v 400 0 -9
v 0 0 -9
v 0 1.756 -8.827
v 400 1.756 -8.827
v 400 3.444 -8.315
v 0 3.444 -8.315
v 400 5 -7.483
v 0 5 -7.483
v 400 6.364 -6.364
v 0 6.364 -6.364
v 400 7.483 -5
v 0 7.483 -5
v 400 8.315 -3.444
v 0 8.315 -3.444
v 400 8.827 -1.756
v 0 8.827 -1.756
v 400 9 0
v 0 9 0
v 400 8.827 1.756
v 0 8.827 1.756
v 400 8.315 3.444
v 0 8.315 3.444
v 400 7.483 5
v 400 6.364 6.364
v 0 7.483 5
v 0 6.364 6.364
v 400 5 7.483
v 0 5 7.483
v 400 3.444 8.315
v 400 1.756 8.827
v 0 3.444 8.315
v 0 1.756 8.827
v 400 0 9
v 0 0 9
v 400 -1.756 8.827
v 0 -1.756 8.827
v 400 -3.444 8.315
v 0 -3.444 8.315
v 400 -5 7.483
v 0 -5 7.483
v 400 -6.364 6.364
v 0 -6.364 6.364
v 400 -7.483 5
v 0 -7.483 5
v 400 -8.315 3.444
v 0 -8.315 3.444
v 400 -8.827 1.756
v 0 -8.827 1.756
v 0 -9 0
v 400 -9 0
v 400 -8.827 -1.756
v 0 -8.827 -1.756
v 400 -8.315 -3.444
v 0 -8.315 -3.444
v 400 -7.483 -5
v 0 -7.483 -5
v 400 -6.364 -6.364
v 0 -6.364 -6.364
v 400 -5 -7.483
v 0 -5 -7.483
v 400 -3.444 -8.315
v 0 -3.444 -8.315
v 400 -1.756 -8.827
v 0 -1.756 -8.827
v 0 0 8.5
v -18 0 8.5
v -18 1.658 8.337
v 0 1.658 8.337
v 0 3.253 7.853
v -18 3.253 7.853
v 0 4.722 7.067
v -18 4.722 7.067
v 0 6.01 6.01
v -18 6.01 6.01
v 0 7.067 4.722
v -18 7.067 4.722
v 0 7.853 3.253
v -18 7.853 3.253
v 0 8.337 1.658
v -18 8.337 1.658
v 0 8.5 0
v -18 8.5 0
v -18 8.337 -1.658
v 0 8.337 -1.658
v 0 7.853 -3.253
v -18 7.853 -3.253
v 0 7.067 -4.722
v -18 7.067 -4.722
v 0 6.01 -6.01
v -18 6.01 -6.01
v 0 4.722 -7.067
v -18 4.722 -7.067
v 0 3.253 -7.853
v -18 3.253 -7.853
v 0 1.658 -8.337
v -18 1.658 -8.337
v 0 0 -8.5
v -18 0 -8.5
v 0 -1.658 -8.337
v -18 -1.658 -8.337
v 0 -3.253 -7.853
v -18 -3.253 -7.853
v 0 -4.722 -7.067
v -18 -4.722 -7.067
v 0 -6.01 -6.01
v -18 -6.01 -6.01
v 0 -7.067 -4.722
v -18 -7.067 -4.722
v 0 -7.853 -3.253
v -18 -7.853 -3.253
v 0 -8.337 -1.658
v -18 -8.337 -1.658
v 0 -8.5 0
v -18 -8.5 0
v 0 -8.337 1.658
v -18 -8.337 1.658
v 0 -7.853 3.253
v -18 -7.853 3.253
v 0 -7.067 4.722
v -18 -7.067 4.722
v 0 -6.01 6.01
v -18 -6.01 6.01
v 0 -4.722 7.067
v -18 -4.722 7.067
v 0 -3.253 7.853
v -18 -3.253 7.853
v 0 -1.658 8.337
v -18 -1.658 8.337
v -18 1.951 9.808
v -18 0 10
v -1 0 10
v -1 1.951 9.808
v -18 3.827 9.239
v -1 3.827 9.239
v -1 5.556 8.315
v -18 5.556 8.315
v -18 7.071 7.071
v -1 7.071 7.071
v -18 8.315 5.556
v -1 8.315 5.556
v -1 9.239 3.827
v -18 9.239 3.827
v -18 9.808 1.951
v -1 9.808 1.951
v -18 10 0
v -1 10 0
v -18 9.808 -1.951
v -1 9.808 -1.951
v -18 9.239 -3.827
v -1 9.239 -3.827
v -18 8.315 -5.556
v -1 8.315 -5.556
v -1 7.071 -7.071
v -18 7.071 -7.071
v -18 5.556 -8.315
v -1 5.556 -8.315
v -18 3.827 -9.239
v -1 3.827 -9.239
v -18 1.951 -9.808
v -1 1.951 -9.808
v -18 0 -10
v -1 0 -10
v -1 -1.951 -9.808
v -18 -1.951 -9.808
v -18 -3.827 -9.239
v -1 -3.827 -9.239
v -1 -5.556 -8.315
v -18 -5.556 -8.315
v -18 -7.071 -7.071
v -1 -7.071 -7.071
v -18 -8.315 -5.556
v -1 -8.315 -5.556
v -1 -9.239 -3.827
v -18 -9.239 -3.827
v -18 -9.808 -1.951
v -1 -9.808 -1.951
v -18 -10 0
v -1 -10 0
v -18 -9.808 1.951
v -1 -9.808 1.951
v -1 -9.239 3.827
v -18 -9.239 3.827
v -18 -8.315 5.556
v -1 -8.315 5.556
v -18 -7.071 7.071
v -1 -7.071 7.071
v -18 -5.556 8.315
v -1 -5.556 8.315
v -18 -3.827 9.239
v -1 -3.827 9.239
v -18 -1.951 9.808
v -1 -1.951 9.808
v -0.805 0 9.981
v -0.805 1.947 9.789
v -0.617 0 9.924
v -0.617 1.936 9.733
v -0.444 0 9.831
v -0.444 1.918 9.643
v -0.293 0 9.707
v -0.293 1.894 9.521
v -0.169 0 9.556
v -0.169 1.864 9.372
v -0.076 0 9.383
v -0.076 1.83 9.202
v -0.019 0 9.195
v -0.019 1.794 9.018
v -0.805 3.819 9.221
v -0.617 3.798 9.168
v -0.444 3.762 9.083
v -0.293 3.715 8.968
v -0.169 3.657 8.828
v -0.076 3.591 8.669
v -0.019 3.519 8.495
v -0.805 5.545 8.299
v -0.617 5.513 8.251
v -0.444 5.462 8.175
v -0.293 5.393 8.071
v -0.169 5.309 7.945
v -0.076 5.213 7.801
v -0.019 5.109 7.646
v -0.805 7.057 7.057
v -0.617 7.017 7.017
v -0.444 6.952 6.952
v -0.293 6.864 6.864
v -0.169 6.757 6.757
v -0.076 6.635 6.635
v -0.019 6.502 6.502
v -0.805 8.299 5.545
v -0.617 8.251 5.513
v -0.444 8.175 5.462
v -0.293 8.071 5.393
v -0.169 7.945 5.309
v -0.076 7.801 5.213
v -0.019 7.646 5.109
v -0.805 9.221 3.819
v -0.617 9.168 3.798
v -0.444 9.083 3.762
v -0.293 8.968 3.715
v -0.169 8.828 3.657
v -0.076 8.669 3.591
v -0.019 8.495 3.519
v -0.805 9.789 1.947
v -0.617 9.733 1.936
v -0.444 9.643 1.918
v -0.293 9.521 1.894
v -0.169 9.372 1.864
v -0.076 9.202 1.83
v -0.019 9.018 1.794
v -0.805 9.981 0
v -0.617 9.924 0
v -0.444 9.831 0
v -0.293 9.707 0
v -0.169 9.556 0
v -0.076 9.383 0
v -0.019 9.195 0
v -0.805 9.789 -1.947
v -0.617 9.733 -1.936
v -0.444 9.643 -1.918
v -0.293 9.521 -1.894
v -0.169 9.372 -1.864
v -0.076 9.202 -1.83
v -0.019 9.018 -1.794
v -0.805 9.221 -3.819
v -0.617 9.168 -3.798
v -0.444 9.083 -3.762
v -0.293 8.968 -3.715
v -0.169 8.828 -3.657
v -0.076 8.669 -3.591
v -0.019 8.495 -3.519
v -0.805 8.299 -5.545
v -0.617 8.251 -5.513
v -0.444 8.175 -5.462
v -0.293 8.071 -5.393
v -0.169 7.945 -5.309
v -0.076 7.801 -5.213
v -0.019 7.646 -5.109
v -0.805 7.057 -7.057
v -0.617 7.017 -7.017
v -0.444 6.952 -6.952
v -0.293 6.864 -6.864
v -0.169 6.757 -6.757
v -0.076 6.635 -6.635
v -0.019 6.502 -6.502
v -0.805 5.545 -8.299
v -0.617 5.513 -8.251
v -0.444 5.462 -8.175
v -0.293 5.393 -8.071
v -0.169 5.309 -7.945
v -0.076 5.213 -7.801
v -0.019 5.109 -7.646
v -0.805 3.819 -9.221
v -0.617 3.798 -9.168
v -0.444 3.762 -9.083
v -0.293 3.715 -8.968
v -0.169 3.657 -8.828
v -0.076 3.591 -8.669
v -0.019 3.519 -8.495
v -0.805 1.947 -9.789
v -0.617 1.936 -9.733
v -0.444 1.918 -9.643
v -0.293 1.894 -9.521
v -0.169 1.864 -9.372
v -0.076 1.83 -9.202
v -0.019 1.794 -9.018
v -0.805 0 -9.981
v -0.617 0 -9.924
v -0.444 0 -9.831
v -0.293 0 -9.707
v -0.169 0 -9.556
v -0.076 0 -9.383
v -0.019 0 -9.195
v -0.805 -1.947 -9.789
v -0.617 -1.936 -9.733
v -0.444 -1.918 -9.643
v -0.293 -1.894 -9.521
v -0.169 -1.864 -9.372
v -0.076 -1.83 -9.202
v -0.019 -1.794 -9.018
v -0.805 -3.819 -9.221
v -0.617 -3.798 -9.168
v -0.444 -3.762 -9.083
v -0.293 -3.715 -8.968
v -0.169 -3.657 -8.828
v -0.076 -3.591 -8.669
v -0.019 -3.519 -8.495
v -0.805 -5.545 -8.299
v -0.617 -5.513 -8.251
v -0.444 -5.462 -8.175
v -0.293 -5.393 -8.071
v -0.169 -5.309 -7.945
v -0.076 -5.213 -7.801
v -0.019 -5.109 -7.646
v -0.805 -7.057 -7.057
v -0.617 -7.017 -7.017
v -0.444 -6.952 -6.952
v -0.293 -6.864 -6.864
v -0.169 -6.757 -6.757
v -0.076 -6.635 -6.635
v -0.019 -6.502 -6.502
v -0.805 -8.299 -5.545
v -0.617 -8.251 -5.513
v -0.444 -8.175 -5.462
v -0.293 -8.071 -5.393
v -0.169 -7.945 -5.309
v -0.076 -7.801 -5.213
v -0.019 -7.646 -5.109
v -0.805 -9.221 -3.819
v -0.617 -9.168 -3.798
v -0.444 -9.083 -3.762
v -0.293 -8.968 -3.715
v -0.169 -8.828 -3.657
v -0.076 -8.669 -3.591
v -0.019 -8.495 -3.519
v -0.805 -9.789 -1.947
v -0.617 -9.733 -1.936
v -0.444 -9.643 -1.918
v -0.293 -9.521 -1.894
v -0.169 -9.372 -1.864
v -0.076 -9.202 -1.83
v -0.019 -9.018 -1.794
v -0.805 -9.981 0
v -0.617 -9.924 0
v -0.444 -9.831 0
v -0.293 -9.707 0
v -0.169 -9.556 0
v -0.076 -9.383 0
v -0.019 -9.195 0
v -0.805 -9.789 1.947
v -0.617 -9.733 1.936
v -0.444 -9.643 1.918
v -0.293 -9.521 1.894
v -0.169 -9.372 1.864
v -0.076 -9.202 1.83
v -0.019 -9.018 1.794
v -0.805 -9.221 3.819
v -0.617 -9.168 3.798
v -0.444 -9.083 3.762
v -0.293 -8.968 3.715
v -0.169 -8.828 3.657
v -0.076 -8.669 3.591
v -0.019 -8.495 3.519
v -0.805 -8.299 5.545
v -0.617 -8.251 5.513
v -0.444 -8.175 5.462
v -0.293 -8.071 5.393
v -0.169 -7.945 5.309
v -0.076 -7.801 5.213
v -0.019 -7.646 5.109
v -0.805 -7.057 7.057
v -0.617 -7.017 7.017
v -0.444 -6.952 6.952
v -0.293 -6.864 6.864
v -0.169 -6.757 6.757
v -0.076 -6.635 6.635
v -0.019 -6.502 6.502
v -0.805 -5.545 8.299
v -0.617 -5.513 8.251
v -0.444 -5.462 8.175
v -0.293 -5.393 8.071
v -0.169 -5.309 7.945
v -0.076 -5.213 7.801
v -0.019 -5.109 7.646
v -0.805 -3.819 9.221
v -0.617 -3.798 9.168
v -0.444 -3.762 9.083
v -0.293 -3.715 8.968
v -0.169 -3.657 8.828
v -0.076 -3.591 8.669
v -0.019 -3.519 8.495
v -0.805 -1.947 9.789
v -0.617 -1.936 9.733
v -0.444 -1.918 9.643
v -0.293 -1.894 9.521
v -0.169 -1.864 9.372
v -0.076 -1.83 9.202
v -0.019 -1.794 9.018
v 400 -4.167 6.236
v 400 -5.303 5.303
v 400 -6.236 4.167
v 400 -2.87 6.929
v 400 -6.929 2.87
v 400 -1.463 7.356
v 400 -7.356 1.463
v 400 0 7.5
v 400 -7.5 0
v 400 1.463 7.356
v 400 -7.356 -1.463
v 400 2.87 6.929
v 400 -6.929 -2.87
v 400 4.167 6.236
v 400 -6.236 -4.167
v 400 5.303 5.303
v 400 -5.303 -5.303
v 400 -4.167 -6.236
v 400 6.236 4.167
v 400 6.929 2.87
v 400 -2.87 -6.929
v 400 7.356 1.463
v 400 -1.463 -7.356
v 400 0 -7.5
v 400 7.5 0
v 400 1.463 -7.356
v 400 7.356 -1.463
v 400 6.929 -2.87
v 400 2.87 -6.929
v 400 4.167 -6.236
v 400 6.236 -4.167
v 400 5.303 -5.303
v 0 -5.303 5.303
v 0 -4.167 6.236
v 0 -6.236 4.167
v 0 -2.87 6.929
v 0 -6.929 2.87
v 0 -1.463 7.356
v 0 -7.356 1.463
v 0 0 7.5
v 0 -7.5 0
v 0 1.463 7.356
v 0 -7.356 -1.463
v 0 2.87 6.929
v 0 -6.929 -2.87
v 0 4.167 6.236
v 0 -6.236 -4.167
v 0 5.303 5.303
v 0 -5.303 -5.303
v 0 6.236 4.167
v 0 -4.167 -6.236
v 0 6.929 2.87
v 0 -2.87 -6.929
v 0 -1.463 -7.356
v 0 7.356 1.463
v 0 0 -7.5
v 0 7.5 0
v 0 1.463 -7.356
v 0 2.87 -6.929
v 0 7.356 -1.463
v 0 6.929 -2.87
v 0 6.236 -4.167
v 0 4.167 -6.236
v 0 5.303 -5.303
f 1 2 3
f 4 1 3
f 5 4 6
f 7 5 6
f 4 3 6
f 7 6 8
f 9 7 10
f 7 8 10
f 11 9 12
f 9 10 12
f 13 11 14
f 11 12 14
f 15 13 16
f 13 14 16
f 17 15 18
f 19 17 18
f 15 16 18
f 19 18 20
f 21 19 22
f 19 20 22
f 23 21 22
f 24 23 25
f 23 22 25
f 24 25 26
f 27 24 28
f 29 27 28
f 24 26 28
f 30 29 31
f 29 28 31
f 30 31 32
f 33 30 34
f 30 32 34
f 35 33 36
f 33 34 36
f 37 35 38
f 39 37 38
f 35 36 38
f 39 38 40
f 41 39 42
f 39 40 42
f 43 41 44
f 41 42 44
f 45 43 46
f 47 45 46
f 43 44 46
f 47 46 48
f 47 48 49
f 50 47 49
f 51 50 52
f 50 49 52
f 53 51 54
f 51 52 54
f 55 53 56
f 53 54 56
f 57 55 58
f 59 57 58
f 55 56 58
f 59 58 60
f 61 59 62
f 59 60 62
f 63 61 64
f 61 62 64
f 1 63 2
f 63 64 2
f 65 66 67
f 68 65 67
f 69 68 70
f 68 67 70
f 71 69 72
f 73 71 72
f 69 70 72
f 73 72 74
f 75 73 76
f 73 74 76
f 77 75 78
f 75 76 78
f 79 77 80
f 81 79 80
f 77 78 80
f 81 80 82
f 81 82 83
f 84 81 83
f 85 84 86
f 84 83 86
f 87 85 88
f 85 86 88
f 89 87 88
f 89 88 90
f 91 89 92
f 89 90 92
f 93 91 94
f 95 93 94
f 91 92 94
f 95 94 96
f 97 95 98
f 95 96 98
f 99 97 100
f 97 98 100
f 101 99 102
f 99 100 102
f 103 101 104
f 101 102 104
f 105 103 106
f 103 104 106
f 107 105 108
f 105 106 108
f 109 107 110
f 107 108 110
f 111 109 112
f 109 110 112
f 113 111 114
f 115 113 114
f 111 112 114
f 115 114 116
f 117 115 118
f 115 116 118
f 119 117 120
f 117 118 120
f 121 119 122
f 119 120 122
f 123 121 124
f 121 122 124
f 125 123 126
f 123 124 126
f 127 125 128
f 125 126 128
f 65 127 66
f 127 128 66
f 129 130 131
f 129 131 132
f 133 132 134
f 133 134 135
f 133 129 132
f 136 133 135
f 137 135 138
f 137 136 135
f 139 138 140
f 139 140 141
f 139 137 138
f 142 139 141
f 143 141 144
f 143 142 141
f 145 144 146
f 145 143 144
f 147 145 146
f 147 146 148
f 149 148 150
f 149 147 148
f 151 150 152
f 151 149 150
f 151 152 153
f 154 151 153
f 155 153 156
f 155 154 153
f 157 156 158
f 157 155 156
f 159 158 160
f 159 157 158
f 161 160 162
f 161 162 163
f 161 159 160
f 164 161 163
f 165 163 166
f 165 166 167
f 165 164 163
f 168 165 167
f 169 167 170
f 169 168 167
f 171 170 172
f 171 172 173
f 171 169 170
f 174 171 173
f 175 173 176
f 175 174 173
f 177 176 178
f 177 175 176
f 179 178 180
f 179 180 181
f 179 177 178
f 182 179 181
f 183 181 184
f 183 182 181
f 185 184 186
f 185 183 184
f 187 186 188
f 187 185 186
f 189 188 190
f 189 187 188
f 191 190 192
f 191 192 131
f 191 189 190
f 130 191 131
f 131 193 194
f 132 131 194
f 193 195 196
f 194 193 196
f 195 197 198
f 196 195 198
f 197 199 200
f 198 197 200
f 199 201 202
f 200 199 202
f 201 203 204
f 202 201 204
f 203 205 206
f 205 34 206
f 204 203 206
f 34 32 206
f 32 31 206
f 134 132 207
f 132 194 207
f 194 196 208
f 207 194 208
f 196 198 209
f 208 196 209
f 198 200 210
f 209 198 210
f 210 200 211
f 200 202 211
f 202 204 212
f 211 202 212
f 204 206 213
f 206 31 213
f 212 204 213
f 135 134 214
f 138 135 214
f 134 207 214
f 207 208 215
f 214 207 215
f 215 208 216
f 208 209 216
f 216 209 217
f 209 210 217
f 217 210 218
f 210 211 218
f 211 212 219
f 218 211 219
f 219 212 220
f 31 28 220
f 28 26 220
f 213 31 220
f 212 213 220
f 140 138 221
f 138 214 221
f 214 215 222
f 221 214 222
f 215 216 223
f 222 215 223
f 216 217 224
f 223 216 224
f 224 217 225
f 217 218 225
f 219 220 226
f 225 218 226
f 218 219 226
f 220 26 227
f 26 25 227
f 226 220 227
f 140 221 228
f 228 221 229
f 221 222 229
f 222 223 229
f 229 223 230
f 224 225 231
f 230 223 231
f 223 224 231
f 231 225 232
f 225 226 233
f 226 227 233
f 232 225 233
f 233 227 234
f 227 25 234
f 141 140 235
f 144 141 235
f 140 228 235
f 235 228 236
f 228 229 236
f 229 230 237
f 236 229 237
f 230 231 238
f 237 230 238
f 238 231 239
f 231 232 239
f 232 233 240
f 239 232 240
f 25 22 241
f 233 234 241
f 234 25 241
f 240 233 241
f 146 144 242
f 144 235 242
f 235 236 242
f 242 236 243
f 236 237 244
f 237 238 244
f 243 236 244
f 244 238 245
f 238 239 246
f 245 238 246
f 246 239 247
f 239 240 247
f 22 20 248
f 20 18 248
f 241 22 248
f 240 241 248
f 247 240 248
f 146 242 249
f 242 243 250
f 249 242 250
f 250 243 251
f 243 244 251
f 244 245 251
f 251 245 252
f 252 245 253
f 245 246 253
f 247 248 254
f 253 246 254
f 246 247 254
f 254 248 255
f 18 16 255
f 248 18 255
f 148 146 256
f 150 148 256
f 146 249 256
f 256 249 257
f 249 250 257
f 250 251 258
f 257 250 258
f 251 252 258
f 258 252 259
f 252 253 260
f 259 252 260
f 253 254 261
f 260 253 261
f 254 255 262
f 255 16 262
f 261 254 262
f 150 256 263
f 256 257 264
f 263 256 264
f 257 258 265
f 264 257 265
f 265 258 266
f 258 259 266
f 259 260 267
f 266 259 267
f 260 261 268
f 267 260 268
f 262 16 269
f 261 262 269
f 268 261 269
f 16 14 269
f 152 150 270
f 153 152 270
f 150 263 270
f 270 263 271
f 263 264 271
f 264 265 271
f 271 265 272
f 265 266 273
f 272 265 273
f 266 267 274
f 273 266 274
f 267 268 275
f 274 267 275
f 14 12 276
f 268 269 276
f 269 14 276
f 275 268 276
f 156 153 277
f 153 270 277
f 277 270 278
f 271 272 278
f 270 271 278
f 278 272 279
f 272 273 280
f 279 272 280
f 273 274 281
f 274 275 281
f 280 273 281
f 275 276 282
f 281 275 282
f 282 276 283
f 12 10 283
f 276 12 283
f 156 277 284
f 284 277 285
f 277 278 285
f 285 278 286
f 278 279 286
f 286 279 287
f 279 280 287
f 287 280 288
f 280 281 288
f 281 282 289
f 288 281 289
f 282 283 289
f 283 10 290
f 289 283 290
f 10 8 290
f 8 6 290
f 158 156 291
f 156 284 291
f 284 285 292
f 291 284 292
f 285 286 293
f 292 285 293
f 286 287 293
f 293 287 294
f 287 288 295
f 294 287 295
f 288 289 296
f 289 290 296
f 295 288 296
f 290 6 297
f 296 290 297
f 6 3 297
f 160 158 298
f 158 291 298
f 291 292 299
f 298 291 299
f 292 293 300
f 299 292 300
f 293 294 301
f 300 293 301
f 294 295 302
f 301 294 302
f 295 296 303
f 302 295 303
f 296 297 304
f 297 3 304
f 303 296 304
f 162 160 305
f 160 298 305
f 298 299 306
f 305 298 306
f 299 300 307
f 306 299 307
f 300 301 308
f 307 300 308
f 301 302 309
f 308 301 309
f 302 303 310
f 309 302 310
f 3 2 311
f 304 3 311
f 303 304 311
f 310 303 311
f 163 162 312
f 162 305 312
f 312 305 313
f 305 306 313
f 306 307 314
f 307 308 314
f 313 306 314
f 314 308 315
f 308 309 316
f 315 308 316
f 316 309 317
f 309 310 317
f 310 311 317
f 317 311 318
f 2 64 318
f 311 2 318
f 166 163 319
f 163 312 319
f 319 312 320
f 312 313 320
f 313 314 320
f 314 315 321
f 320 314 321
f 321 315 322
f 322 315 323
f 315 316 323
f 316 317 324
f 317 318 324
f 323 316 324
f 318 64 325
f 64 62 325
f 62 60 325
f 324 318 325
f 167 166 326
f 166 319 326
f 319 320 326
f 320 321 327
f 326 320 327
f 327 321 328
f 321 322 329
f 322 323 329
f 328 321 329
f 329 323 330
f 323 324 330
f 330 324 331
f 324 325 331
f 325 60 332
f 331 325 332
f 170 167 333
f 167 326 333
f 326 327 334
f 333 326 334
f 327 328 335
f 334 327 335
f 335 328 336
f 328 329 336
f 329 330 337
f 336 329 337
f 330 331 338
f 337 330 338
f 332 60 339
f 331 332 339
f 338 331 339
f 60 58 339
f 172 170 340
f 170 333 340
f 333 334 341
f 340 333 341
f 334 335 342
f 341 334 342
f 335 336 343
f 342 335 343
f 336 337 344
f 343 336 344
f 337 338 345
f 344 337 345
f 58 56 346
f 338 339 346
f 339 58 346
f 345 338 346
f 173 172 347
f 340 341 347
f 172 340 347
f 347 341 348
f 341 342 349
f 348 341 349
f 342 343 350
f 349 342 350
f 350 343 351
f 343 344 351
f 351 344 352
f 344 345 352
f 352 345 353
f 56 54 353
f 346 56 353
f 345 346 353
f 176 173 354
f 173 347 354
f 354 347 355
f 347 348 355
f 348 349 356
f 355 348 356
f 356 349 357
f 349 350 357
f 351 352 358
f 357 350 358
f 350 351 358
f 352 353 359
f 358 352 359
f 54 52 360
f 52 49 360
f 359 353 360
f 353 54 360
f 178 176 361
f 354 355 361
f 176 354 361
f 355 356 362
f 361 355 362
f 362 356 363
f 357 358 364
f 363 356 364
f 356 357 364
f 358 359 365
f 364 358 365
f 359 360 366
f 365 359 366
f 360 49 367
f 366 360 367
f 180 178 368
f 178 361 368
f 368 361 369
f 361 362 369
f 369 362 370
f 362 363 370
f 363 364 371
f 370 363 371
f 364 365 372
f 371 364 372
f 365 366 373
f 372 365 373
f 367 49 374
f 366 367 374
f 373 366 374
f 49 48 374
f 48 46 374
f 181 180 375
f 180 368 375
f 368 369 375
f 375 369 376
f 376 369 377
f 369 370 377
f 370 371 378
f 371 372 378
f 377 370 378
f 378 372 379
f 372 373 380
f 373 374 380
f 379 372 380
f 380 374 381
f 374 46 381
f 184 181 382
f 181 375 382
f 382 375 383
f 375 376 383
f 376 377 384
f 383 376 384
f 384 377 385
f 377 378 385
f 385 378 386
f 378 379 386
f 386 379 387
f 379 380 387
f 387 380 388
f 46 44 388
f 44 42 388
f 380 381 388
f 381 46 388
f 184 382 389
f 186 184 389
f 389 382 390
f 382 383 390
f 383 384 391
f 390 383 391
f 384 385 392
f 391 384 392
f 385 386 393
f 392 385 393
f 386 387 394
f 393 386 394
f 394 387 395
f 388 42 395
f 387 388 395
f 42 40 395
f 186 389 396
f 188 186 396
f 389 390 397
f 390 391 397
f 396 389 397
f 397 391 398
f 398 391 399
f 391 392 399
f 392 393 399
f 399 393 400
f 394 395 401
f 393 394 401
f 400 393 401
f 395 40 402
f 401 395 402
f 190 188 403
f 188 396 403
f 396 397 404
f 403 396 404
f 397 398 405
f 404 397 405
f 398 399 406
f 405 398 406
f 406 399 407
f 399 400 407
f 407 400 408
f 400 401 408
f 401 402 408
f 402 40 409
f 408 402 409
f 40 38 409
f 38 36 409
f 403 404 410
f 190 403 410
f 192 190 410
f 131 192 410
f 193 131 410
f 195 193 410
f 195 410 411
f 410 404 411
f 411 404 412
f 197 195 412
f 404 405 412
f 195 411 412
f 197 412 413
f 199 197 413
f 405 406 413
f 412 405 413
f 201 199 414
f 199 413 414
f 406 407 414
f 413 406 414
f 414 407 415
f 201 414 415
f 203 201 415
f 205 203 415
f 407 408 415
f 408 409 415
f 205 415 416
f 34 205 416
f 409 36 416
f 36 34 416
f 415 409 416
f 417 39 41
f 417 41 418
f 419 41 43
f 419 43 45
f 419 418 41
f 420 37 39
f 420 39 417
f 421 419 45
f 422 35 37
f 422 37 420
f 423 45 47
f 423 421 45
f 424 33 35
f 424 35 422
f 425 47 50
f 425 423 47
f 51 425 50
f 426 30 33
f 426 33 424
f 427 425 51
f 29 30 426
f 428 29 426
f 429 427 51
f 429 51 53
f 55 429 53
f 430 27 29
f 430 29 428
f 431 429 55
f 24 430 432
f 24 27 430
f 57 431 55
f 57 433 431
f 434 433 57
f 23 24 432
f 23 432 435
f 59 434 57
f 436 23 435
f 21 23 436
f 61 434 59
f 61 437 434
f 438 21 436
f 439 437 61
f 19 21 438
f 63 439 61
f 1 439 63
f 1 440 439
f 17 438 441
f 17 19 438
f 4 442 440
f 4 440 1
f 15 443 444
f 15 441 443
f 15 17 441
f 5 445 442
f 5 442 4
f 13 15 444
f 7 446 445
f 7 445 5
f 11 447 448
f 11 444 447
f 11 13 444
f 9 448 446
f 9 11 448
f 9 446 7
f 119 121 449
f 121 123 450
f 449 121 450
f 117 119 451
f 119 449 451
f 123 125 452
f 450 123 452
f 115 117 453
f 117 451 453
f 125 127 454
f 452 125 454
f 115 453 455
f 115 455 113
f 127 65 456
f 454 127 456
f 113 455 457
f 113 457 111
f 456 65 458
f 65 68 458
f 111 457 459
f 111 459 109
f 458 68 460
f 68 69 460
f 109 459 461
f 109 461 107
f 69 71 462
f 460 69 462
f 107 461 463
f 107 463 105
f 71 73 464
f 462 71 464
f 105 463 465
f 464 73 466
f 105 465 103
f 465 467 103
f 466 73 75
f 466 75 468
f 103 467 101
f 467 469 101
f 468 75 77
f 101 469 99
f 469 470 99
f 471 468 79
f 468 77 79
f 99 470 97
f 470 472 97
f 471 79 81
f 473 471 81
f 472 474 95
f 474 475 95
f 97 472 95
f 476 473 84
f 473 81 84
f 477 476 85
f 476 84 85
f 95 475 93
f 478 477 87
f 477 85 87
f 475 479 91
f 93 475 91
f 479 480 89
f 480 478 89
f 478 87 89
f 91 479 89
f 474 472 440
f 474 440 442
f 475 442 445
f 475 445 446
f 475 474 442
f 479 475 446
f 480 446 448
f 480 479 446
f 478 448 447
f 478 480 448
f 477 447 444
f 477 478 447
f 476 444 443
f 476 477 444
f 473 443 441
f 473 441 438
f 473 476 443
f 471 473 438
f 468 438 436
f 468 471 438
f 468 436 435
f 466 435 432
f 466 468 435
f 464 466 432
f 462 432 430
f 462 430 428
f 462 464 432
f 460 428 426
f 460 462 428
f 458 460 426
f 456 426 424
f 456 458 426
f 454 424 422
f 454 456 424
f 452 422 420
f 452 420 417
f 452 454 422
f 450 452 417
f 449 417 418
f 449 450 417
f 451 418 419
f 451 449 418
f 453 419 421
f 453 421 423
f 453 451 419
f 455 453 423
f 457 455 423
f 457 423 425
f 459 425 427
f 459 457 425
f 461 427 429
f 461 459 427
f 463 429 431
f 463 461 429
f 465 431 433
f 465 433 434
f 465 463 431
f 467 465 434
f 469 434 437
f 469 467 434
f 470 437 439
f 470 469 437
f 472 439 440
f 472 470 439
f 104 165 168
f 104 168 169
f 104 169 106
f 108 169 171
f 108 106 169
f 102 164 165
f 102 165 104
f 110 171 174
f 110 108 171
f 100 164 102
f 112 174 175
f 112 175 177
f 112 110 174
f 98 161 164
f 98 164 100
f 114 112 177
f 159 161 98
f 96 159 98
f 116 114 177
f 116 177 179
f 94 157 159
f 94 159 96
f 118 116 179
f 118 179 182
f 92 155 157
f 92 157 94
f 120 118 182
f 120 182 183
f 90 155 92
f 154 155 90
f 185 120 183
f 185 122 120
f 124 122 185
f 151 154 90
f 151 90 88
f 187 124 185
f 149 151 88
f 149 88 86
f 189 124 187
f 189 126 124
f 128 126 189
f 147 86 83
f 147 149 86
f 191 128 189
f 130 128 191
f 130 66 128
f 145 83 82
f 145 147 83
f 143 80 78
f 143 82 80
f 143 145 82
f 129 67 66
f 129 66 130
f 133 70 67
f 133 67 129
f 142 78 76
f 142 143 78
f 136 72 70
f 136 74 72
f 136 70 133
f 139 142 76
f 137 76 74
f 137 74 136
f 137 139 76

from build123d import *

# Parameters (mm, degrees)
SKETCH_1_R      = 9
SKETCH_1_R_2    = 7.5
EXTRUDE_2_DEPTH = 400
SKETCH_3_R      = 10
SKETCH_3_R_2    = 8.5
EXTRUDE_3_DEPTH = 18
FILLET_2_R      = 1


with BuildPart() as part:
    # 草圖1 → 填料-伸長2 (new body)
    with BuildSketch(Plane(origin=(0, 0, 0), x_dir=(0, 0, -1), z_dir=(1, 0, 0))):
        Circle(SKETCH_1_R)
        Circle(SKETCH_1_R_2, mode=Mode.SUBTRACT)
    extrude(amount=EXTRUDE_2_DEPTH)

    # 草圖3 → 填料-伸長3 (add)
    with BuildSketch(Plane.ZY.offset(18)):
        Circle(SKETCH_3_R)
        Circle(SKETCH_3_R_2, mode=Mode.SUBTRACT)
    extrude(amount=-EXTRUDE_3_DEPTH)

    # 圓角2
    fillet_2_edges = [part.edges().sort_by_distance(p)[0] for p in [
        (0, 0, -10),
    ]]
    fillet(fillet_2_edges, radius=FILLET_2_R - 0.0001)  # a hair under: the kernel refuses the full size


solid = part.part
